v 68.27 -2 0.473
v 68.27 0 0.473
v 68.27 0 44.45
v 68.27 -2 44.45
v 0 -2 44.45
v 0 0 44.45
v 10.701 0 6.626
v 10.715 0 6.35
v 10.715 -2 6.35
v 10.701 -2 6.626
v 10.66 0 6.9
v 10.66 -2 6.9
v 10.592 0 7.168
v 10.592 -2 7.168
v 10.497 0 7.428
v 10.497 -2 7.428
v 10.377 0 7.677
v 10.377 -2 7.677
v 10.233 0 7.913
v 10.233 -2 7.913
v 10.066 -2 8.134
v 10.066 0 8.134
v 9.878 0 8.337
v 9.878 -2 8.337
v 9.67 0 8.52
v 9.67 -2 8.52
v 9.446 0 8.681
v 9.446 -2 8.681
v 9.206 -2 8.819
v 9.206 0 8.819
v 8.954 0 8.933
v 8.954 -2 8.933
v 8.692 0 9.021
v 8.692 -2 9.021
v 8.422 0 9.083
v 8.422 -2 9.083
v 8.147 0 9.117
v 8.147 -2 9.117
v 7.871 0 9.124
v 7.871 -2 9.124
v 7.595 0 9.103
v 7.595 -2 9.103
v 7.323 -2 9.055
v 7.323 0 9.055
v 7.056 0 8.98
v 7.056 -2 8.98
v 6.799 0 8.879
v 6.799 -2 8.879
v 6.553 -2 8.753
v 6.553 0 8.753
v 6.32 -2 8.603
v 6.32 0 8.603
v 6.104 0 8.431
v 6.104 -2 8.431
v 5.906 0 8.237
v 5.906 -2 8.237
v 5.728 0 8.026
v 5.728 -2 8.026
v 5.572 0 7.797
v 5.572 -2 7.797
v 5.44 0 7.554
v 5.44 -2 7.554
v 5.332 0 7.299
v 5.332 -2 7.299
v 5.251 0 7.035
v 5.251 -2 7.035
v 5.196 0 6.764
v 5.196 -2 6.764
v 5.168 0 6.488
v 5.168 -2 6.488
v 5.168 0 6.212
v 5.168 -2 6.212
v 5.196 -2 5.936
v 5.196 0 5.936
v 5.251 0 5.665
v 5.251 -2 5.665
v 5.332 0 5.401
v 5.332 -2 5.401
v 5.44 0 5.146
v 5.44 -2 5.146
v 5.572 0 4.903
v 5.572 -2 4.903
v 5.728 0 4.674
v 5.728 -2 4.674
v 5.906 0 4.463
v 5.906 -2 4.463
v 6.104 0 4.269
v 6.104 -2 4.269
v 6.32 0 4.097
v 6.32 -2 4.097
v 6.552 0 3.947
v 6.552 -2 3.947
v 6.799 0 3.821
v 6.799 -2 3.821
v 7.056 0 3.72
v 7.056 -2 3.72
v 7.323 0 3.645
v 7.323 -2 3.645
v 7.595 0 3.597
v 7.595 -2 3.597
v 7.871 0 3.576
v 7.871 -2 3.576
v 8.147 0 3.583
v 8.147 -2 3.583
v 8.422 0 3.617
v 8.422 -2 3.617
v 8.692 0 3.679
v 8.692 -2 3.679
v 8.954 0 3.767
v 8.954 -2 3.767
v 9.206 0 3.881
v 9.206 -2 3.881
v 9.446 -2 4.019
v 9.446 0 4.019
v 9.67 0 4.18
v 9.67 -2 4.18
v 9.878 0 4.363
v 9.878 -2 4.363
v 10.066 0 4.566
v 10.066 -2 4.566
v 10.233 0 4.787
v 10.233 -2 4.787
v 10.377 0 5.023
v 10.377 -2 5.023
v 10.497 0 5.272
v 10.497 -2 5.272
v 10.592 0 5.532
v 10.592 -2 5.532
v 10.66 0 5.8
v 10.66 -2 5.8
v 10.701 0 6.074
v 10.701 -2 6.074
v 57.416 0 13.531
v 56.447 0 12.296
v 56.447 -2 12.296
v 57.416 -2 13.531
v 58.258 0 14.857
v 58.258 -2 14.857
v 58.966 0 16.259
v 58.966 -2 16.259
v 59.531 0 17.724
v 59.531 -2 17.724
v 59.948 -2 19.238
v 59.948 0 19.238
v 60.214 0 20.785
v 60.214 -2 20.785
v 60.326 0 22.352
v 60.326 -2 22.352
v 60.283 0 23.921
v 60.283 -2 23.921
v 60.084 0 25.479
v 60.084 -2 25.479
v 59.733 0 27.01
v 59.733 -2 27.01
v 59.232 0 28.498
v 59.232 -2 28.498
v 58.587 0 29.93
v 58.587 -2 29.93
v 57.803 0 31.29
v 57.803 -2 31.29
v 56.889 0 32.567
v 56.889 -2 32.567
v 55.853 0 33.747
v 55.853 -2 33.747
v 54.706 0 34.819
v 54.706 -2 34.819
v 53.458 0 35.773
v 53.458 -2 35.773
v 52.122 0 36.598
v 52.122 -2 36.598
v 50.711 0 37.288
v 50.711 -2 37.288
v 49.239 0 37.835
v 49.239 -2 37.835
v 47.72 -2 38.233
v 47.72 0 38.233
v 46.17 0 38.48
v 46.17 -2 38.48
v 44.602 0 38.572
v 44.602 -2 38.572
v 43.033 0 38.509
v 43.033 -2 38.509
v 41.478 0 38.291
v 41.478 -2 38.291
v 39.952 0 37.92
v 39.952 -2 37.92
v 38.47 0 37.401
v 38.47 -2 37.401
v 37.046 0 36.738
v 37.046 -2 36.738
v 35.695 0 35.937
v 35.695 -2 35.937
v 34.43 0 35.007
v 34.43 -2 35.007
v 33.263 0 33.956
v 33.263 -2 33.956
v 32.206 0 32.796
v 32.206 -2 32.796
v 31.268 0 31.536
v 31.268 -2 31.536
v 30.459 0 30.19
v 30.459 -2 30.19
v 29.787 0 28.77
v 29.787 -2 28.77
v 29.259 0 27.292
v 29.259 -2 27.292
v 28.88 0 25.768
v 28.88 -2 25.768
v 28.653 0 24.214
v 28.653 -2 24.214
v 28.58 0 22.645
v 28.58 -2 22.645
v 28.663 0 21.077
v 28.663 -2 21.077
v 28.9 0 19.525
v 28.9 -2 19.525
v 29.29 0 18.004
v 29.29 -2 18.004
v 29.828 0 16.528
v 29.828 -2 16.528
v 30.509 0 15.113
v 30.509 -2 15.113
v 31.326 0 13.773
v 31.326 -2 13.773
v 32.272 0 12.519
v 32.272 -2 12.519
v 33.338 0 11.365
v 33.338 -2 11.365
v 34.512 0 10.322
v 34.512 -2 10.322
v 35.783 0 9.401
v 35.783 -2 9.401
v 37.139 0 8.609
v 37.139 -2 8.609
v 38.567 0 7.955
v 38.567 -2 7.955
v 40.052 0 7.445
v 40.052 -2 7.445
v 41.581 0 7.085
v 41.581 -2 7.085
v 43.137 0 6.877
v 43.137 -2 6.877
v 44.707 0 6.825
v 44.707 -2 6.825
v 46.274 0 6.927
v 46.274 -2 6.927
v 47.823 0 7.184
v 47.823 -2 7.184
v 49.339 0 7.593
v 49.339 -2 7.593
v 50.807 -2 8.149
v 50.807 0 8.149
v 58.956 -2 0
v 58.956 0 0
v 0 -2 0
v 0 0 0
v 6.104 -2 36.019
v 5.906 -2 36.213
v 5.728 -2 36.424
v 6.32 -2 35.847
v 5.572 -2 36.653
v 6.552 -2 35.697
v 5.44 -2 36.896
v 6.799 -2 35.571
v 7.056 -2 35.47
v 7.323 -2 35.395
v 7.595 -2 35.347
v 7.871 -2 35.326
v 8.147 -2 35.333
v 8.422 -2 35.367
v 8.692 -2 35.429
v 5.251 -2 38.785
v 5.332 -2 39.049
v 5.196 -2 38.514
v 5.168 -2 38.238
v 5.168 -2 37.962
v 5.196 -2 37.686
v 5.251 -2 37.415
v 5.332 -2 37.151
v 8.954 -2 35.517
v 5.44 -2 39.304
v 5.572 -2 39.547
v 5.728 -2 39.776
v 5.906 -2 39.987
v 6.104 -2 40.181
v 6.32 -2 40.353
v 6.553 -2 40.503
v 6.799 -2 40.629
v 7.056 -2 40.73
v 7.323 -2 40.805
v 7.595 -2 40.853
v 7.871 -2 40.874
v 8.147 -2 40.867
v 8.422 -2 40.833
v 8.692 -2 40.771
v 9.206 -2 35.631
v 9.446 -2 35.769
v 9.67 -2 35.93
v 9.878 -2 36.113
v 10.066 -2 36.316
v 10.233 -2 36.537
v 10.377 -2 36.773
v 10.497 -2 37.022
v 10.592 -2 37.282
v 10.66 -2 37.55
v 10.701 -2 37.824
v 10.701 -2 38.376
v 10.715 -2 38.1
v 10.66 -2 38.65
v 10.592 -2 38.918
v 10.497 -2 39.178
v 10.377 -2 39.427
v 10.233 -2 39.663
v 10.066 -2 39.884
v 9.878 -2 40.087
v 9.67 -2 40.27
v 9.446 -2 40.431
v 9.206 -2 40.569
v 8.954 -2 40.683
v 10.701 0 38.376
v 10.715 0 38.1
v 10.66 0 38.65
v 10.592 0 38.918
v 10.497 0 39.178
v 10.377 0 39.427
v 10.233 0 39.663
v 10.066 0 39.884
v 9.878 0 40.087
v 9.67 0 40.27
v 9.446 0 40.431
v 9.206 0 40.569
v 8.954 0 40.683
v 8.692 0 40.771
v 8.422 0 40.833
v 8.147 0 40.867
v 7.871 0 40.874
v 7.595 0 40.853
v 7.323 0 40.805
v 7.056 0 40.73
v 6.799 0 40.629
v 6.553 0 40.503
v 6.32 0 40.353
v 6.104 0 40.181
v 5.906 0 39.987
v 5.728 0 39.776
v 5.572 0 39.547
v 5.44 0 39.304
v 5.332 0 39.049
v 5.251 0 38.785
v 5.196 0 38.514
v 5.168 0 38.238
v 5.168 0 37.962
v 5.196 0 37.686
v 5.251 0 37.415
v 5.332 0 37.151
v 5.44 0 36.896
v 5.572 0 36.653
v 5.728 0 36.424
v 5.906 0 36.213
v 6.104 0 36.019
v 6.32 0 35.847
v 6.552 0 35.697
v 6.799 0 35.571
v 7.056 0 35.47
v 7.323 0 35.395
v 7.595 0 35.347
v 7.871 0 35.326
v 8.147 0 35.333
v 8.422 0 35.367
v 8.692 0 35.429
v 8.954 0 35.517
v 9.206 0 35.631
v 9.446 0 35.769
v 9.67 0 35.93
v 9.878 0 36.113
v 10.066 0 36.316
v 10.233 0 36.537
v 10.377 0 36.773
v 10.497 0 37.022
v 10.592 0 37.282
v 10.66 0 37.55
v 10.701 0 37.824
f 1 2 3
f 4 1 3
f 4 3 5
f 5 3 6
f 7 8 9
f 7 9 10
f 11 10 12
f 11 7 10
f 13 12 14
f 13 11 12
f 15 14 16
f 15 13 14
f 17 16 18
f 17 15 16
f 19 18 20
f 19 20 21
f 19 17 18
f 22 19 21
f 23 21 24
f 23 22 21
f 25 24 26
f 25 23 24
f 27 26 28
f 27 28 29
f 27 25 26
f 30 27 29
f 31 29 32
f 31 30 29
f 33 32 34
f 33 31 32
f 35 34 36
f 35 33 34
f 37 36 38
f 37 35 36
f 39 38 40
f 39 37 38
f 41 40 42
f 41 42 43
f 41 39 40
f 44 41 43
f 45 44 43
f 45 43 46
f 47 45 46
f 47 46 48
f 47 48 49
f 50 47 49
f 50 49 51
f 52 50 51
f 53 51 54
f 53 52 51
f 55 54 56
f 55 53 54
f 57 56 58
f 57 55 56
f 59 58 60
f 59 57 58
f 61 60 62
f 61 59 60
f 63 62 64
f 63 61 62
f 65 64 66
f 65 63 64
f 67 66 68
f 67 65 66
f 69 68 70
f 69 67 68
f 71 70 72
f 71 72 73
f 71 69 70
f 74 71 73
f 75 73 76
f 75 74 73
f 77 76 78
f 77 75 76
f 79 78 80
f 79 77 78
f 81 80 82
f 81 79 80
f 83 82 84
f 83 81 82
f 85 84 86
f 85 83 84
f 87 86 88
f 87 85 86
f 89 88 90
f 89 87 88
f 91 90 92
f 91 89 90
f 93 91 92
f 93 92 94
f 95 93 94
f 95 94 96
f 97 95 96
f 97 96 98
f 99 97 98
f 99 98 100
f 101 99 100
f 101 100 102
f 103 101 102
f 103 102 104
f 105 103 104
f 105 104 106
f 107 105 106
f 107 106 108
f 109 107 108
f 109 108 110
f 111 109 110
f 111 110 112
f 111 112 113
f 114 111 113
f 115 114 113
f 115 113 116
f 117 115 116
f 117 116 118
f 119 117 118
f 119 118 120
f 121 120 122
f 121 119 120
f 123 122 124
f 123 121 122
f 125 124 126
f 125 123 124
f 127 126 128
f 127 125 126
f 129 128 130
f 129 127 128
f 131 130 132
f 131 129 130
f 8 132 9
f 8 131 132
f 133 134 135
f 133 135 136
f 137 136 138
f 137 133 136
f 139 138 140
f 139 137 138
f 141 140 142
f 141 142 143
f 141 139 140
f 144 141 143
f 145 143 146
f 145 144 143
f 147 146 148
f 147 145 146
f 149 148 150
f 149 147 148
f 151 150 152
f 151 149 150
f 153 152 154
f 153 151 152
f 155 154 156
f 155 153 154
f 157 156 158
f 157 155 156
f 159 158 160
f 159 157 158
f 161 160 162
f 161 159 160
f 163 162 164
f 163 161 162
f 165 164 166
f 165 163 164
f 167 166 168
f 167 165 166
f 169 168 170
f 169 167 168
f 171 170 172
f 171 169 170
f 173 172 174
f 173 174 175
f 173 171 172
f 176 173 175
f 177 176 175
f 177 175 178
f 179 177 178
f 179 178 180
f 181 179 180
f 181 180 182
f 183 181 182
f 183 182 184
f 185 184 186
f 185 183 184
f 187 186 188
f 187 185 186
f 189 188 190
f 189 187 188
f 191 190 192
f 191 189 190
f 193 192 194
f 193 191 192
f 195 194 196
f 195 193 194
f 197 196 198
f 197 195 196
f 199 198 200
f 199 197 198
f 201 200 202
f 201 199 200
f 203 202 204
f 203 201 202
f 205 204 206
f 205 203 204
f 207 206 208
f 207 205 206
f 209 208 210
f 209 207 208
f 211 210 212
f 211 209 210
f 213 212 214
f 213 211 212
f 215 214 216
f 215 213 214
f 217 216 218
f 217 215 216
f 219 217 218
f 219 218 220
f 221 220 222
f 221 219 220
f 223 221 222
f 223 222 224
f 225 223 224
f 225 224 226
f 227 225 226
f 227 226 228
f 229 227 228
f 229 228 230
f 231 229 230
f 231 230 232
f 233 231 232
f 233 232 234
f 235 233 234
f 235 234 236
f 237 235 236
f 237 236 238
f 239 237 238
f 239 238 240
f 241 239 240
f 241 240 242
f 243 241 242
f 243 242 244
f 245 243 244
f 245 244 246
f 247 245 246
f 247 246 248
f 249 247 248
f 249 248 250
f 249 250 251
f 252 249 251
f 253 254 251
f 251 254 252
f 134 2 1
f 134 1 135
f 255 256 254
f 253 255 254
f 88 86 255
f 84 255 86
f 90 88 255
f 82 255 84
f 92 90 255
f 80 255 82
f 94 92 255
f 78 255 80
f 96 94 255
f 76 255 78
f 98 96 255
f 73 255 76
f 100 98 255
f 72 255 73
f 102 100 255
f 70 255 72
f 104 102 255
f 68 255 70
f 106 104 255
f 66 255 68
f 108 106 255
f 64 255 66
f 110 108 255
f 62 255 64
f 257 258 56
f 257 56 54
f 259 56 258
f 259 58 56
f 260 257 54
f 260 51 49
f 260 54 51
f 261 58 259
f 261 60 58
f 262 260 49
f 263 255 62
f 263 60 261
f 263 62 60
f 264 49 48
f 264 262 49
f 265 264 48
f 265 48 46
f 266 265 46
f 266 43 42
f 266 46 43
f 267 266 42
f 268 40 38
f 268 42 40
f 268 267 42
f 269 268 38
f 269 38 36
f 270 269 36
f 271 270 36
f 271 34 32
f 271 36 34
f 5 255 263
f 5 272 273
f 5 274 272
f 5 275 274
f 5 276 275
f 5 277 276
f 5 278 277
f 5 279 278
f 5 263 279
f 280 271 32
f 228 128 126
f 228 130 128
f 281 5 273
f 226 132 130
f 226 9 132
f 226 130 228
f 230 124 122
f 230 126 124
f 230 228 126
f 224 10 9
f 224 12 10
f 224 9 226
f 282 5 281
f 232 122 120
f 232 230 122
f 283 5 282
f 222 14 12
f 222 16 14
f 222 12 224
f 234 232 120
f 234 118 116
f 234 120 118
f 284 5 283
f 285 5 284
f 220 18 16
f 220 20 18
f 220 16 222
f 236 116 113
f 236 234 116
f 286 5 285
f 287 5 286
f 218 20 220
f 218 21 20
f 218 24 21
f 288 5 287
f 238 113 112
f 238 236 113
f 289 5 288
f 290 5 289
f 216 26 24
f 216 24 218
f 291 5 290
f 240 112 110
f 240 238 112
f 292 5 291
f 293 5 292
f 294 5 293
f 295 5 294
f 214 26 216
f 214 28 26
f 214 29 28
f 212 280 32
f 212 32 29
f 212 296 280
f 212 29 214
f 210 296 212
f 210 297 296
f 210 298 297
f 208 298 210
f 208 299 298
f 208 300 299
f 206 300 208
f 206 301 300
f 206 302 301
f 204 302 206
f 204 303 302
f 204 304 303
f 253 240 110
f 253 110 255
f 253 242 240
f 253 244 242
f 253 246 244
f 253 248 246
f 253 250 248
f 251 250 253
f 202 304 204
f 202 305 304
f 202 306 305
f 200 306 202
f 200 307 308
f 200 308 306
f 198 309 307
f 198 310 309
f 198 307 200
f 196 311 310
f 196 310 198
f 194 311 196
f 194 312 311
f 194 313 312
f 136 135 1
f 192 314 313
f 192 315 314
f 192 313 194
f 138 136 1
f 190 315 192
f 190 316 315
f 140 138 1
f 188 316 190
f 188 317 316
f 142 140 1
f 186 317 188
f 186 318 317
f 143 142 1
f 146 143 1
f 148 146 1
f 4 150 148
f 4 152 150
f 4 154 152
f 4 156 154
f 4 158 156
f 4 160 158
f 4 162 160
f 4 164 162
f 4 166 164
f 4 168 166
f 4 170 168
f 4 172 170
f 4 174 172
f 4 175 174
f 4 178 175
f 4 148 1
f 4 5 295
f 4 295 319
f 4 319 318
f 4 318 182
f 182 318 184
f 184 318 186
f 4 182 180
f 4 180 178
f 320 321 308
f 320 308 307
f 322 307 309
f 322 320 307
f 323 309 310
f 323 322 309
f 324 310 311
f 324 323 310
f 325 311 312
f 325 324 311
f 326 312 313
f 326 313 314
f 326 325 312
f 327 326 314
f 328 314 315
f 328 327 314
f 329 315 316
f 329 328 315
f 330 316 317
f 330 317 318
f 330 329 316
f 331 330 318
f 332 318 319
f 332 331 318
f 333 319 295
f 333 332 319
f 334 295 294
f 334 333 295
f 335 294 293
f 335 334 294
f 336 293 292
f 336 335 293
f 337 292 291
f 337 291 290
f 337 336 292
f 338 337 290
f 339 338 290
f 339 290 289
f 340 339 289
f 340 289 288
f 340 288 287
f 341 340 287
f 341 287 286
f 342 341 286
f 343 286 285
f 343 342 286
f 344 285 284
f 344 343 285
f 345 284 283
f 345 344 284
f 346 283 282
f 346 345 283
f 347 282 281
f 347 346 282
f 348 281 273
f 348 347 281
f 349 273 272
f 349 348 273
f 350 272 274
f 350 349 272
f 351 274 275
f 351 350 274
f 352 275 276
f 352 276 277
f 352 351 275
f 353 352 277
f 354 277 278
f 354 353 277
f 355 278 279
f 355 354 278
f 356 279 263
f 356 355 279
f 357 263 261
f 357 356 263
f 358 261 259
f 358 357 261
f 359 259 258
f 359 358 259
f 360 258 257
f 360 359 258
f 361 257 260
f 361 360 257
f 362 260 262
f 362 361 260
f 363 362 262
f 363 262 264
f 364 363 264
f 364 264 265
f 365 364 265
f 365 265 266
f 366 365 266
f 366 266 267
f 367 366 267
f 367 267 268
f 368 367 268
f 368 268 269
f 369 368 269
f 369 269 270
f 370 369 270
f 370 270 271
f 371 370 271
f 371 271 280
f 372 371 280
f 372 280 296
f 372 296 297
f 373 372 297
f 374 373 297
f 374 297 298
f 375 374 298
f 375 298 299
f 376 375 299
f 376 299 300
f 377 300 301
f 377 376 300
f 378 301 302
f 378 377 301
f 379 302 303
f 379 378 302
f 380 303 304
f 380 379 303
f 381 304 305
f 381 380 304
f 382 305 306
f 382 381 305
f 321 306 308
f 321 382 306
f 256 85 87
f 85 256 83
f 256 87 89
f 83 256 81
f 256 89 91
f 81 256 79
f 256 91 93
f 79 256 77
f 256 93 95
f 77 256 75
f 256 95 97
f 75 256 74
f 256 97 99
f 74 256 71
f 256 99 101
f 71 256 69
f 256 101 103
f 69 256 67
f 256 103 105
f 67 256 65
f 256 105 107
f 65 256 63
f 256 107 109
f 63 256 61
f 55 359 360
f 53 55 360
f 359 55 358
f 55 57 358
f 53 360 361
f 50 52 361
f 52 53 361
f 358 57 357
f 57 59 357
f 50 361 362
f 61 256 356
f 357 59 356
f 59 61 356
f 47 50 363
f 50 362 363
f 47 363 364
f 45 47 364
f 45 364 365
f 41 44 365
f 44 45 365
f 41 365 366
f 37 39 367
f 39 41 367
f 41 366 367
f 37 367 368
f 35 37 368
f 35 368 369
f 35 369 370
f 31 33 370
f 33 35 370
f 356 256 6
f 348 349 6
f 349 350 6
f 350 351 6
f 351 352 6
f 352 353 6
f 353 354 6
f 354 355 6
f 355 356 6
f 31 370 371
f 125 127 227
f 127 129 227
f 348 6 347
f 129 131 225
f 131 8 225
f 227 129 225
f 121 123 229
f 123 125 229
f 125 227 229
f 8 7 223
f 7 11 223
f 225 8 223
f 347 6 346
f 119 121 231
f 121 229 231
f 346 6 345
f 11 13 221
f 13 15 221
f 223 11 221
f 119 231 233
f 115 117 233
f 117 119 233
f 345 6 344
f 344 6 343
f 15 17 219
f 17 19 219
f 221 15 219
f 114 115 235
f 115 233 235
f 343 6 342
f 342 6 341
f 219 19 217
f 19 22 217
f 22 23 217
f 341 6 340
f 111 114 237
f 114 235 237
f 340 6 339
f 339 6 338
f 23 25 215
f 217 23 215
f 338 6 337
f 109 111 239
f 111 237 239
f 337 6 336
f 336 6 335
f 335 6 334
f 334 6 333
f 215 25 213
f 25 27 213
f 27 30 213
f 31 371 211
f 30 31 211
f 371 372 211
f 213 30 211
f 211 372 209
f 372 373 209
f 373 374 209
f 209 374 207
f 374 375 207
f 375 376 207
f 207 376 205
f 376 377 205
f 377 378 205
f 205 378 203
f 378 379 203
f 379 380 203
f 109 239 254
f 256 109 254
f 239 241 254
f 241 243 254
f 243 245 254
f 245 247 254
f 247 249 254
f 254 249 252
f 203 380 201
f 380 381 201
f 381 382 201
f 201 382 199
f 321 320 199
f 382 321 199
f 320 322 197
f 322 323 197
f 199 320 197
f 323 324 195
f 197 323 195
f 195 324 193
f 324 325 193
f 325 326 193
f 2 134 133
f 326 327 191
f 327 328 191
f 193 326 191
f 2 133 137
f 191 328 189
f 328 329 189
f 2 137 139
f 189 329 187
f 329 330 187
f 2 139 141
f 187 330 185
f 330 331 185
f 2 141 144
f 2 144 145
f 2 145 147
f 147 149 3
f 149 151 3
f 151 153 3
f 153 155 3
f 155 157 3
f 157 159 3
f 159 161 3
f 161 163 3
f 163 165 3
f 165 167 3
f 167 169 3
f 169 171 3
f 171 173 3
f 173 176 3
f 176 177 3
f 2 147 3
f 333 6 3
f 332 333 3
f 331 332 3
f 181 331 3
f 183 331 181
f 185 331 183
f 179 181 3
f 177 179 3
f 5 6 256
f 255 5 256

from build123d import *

# Parameters (mm, degrees)
SKETCH_R  = 2.775
PAD_DEPTH = 2


with BuildPart() as part:
    # Sketch → Pad (new body)
    with BuildSketch(Plane.XZ):
        with BuildLine():
            Line((0, 0), (58.956405, 0))
            Line((58.956405, 0), (50.807402, 8.149004))
            ThreePointArc((56.447133, 12.2955), (35.051339, 35.487738), (50.807402, 8.149004))
            Line((68.27, 0.472633), (56.447133, 12.2955))
            Line((68.27, 0.472633), (68.27, 44.45))
            Line((68.27, 44.45), (0, 44.45))
            Line((0, 44.45), (0, 0))
        make_face()
        with Locations((7.94, 6.35)):
            Circle(SKETCH_R, mode=Mode.SUBTRACT)
        with Locations((7.94, 38.1)):
            Circle(SKETCH_R, mode=Mode.SUBTRACT)
    extrude(amount=PAD_DEPTH)


solid = part.part
